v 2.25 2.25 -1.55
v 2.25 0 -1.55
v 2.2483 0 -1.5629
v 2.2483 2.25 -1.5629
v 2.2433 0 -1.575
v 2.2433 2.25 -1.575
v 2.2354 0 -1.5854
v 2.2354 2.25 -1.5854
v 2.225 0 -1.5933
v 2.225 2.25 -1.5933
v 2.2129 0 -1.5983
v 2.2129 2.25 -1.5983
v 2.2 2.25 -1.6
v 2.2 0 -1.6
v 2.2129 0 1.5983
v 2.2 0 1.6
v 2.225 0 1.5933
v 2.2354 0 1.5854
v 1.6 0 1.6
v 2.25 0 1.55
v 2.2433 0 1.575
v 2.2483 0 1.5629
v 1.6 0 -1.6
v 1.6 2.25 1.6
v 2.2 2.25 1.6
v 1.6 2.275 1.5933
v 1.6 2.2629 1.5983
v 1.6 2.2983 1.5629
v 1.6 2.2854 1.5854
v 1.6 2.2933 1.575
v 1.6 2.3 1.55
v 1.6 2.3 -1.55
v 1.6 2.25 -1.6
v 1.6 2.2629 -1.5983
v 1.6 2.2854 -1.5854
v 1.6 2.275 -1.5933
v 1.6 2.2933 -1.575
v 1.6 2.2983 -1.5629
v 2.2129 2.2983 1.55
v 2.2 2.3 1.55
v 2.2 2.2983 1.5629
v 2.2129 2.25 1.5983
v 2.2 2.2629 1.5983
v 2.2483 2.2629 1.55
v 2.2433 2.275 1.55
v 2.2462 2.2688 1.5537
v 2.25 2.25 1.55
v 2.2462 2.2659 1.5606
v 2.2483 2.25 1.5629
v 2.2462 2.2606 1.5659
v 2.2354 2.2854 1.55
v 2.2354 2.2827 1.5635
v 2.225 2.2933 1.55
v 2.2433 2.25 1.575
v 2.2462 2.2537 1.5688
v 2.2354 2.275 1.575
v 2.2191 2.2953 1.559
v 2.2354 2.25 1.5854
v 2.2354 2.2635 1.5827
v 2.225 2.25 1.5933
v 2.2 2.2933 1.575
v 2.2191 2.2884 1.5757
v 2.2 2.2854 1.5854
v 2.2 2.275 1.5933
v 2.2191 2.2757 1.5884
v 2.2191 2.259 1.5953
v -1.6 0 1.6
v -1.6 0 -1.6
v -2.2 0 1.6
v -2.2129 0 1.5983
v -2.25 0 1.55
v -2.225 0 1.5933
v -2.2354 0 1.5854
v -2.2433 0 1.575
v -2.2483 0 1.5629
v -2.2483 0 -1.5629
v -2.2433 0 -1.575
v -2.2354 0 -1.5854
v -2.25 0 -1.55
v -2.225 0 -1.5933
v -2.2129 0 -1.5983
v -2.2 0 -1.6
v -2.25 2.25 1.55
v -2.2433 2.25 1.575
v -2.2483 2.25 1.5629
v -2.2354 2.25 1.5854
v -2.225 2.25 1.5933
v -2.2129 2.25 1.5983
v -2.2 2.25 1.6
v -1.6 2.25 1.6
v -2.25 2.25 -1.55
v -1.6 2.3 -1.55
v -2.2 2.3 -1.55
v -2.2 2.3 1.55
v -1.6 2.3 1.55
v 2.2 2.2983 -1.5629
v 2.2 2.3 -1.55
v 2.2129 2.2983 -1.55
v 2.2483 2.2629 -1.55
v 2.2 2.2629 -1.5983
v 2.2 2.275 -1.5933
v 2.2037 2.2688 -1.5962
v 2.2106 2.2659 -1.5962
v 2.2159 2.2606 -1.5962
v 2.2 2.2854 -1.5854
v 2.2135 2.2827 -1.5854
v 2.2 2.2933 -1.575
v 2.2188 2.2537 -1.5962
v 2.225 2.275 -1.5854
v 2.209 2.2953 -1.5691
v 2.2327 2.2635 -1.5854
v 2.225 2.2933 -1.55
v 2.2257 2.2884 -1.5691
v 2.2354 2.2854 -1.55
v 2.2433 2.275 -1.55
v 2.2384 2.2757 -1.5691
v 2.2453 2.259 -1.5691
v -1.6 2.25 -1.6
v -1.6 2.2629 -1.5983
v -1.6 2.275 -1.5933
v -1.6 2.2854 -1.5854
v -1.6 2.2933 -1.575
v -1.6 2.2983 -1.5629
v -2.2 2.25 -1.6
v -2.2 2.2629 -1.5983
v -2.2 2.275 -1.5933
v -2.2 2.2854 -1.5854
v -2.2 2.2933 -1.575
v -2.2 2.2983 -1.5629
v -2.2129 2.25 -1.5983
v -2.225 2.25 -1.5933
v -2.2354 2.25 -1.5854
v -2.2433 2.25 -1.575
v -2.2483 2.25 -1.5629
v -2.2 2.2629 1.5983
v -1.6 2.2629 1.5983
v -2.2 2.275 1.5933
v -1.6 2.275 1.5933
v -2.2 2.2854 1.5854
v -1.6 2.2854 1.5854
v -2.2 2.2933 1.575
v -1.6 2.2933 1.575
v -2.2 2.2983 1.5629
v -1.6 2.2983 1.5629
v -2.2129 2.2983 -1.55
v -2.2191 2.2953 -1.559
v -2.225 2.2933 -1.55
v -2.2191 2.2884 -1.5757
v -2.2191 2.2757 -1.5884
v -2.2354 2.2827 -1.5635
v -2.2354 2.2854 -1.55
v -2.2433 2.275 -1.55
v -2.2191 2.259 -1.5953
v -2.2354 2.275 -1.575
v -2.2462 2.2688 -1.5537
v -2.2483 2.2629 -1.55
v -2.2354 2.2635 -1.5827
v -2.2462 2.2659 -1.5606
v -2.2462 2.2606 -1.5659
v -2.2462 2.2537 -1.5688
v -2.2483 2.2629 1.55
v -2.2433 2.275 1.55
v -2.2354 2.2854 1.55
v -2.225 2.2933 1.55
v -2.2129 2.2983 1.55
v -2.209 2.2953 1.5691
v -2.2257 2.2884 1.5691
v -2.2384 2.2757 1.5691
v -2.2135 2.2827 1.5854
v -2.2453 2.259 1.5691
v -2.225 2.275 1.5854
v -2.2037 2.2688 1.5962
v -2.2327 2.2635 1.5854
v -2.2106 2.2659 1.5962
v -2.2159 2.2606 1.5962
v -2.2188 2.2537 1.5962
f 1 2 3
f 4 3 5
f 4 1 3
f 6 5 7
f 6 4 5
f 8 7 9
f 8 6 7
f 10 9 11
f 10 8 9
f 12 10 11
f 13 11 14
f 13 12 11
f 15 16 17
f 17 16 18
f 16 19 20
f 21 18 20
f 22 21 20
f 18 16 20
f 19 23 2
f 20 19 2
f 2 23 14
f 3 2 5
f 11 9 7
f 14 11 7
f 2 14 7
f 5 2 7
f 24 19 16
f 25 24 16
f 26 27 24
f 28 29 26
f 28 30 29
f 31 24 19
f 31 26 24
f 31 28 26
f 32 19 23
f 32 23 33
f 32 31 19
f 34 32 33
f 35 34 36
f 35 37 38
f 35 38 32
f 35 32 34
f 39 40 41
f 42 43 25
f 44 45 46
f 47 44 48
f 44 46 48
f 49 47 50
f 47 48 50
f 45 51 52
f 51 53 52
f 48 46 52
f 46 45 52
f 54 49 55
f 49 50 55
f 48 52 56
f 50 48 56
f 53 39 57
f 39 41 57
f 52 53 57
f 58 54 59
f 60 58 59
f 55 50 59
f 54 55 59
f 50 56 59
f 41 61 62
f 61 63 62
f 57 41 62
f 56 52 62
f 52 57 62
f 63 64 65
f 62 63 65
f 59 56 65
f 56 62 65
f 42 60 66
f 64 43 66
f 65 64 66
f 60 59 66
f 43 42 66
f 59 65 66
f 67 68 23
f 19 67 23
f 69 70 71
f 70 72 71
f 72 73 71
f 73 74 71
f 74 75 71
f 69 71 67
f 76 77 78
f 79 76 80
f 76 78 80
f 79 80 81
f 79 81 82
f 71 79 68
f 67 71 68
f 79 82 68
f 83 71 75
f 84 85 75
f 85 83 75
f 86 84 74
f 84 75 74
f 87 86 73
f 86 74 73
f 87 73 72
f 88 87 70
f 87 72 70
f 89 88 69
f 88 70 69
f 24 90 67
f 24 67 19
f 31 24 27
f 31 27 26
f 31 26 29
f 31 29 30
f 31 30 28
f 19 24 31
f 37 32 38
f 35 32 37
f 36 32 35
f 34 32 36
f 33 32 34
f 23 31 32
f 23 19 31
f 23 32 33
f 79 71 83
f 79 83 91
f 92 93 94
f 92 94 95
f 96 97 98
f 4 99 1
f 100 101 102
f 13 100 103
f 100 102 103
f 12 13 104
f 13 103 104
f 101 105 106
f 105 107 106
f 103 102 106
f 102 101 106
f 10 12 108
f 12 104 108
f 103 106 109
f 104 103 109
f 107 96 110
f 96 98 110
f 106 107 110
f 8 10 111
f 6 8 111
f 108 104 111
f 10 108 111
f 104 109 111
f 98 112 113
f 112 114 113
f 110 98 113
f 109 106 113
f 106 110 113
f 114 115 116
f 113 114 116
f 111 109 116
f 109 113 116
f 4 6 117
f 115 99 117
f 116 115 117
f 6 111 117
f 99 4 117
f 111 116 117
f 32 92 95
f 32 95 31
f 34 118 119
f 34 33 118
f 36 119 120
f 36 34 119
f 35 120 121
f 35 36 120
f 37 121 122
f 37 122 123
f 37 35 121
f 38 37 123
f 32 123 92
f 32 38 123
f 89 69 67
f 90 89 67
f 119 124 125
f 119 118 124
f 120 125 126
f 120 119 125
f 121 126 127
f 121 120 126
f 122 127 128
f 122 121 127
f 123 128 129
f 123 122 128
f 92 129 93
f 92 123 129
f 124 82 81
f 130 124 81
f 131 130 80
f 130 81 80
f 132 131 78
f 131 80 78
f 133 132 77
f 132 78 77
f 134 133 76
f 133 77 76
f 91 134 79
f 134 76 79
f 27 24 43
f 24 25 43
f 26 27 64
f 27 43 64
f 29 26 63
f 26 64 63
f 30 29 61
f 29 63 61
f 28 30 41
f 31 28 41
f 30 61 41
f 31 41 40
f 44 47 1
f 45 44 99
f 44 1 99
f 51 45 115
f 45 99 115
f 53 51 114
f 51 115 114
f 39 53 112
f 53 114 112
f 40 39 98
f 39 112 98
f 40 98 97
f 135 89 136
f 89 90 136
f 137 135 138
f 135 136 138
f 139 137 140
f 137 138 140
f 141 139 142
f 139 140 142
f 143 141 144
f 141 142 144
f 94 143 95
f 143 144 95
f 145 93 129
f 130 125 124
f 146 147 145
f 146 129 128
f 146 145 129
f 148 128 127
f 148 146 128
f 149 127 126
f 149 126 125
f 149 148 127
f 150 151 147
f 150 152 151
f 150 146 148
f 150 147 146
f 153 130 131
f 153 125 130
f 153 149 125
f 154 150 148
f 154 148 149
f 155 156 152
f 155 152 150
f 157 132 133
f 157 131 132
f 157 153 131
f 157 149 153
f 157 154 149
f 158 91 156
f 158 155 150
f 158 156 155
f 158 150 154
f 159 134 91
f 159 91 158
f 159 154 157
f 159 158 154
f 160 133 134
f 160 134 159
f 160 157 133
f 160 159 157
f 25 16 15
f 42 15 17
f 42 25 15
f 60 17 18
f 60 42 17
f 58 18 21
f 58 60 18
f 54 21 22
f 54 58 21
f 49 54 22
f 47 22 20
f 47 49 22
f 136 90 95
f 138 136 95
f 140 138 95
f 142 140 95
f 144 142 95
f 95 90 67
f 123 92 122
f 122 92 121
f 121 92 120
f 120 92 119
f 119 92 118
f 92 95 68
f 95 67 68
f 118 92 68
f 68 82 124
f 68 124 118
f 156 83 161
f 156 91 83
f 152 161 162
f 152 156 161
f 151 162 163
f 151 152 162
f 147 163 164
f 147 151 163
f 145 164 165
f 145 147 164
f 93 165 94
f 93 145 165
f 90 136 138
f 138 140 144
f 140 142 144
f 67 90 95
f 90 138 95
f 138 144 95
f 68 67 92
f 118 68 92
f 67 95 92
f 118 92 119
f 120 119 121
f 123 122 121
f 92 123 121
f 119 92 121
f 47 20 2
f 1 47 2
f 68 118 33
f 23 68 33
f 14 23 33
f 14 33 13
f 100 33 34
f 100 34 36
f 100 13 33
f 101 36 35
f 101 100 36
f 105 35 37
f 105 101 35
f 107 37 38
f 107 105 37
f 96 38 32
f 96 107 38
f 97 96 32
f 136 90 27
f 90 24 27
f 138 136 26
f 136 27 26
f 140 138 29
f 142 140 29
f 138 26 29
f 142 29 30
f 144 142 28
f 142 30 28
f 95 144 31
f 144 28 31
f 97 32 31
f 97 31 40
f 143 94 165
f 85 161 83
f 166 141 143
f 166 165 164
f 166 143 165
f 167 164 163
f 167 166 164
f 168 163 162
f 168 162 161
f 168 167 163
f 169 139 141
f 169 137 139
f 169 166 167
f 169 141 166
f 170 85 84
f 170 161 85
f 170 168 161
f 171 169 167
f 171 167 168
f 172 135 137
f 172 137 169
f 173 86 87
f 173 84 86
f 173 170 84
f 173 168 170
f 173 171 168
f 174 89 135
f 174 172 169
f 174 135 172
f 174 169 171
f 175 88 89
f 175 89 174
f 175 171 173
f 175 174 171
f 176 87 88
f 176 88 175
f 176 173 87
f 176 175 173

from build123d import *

# Parameters (mm, degrees)
CROQUIS1_W                = 0.65
CROQUIS1_H                = 3.2
SALIENTE_EXTRUIR1_DEPTH   = 2.3
SALIENTE_EXTRUIR1_2_DEPTH = 2.3
CROQUIS2_W                = 3.2
CROQUIS2_H                = 3.2
SALIENTE_EXTRUIR2_DEPTH   = 2.3
REDONDEO1_R               = 0.05
REDONDEO2_R               = 0.05
REDONDEO3_R               = 0.05
REDONDEO4_R               = 0.05


with BuildPart() as part:
    # Croquis1 → Saliente-Extruir1 (new body)
    with BuildSketch(Plane(origin=(0, 0, 0), x_dir=(1, 0, 0), z_dir=(0, 1, 0))):
        with Locations((-1.925, 0)):
            Rectangle(CROQUIS1_W, CROQUIS1_H)
    extrude(amount=SALIENTE_EXTRUIR1_DEPTH)

    # Redondeo1
    redondeo1_edges = [part.edges().sort_by_distance(p)[0] for p in [
        (-2.25, 2.3, 0),
        (-1.925, 2.3, 1.6),
        (-1.925, 2.3, -1.6),
    ]]
    fillet(redondeo1_edges, radius=REDONDEO1_R)

    # Redondeo4
    # the kernel refuses this fillet: 0.05 mm, written as the material it takes off along each edge
    with BuildSketch(Plane(origin=(-2.2, 2.25, 1.55), x_dir=(-1, 0, 0), z_dir=(0, 0, 1))) as redondeo4_piece_1_section:
        Polygon((0, 0), (REDONDEO4_R, 0), (REDONDEO4_R, -REDONDEO4_R), (0, -REDONDEO4_R), align=None)
    redondeo4_piece_1 = extrude(amount=REDONDEO4_R, mode=Mode.PRIVATE)
    redondeo4_piece_1 = redondeo4_piece_1 - Plane(origin=(-2.2, 2.25, 1.55), x_dir=(0.7071067811865475, -0.7071067811865475, 0), z_dir=(0, 0, 1)) * Sphere(REDONDEO4_R, mode=Mode.PRIVATE)
    add(redondeo4_piece_1, mode=Mode.SUBTRACT)
    with BuildSketch(Plane(origin=(-2.2, 2.25, -1.55), x_dir=(0, 0, -1), z_dir=(-1, 0, 0))) as redondeo4_piece_2_section:
        Polygon((0, 0), (REDONDEO4_R, 0), (REDONDEO4_R, -REDONDEO4_R), (0, -REDONDEO4_R), align=None)
    redondeo4_piece_2 = extrude(amount=REDONDEO4_R, mode=Mode.PRIVATE)
    redondeo4_piece_2 = redondeo4_piece_2 - Plane(origin=(-2.2, 2.25, -1.55), x_dir=(0, -0.7071067811865475, 0.7071067811865475), z_dir=(-1, 0, 0)) * Sphere(REDONDEO4_R, mode=Mode.PRIVATE)
    add(redondeo4_piece_2, mode=Mode.SUBTRACT)
    with BuildSketch(Plane(origin=(-2.25, -0.125, -1.6), x_dir=(0, 0, 1), z_dir=(0, 1, 0)), Plane(origin=(-2.25, -0.125, 1.6), x_dir=(1, 0, 0), z_dir=(0, 1, 0))) as redondeo4_piece_3:
        with BuildLine():
            CenterArc((REDONDEO4_R, REDONDEO4_R), REDONDEO4_R, 180, 90)
            Line((0, REDONDEO4_R), (0, 0))
            Line((0, 0), (REDONDEO4_R, 0))
        make_face()
    extrude(amount=2.375, mode=Mode.SUBTRACT)


with BuildPart() as body_2:
    # Croquis1 → Saliente-Extruir1 2 (new body)
    with BuildSketch(Plane(origin=(0, 0, 0), x_dir=(1, 0, 0), z_dir=(0, 1, 0))):
        with Locations((1.925, 0)):
            Rectangle(CROQUIS1_W, CROQUIS1_H)
    extrude(amount=SALIENTE_EXTRUIR1_2_DEPTH)

    # Redondeo3
    redondeo3_edges = [body_2.edges().sort_by_distance(p)[0] for p in [
        (1.925, 2.3, 1.6),
        (2.25, 2.3, 0),
        (1.925, 2.3, -1.6),
        (2.25, 1.15, -1.6),
        (2.25, 1.15, 1.6),
    ]]
    fillet(redondeo3_edges, radius=REDONDEO3_R)


with BuildPart() as body_3:
    # Croquis2 → Saliente-Extruir2 (new, through all)
    with BuildSketch(Plane(origin=(0, 2.3, 0), x_dir=(1, 0, 0), z_dir=(0, 1, 0))):
        Rectangle(CROQUIS2_W, CROQUIS2_H)
    extrude(amount=-SALIENTE_EXTRUIR2_DEPTH)

    # Redondeo2
    redondeo2_edges = [body_3.edges().sort_by_distance(p)[0] for p in [
        (0, 2.3, -1.6),
        (0, 2.3, 1.6),
    ]]
    fillet(redondeo2_edges, radius=REDONDEO2_R)


solid = Compound([part.part, body_2.part, body_3.part])
